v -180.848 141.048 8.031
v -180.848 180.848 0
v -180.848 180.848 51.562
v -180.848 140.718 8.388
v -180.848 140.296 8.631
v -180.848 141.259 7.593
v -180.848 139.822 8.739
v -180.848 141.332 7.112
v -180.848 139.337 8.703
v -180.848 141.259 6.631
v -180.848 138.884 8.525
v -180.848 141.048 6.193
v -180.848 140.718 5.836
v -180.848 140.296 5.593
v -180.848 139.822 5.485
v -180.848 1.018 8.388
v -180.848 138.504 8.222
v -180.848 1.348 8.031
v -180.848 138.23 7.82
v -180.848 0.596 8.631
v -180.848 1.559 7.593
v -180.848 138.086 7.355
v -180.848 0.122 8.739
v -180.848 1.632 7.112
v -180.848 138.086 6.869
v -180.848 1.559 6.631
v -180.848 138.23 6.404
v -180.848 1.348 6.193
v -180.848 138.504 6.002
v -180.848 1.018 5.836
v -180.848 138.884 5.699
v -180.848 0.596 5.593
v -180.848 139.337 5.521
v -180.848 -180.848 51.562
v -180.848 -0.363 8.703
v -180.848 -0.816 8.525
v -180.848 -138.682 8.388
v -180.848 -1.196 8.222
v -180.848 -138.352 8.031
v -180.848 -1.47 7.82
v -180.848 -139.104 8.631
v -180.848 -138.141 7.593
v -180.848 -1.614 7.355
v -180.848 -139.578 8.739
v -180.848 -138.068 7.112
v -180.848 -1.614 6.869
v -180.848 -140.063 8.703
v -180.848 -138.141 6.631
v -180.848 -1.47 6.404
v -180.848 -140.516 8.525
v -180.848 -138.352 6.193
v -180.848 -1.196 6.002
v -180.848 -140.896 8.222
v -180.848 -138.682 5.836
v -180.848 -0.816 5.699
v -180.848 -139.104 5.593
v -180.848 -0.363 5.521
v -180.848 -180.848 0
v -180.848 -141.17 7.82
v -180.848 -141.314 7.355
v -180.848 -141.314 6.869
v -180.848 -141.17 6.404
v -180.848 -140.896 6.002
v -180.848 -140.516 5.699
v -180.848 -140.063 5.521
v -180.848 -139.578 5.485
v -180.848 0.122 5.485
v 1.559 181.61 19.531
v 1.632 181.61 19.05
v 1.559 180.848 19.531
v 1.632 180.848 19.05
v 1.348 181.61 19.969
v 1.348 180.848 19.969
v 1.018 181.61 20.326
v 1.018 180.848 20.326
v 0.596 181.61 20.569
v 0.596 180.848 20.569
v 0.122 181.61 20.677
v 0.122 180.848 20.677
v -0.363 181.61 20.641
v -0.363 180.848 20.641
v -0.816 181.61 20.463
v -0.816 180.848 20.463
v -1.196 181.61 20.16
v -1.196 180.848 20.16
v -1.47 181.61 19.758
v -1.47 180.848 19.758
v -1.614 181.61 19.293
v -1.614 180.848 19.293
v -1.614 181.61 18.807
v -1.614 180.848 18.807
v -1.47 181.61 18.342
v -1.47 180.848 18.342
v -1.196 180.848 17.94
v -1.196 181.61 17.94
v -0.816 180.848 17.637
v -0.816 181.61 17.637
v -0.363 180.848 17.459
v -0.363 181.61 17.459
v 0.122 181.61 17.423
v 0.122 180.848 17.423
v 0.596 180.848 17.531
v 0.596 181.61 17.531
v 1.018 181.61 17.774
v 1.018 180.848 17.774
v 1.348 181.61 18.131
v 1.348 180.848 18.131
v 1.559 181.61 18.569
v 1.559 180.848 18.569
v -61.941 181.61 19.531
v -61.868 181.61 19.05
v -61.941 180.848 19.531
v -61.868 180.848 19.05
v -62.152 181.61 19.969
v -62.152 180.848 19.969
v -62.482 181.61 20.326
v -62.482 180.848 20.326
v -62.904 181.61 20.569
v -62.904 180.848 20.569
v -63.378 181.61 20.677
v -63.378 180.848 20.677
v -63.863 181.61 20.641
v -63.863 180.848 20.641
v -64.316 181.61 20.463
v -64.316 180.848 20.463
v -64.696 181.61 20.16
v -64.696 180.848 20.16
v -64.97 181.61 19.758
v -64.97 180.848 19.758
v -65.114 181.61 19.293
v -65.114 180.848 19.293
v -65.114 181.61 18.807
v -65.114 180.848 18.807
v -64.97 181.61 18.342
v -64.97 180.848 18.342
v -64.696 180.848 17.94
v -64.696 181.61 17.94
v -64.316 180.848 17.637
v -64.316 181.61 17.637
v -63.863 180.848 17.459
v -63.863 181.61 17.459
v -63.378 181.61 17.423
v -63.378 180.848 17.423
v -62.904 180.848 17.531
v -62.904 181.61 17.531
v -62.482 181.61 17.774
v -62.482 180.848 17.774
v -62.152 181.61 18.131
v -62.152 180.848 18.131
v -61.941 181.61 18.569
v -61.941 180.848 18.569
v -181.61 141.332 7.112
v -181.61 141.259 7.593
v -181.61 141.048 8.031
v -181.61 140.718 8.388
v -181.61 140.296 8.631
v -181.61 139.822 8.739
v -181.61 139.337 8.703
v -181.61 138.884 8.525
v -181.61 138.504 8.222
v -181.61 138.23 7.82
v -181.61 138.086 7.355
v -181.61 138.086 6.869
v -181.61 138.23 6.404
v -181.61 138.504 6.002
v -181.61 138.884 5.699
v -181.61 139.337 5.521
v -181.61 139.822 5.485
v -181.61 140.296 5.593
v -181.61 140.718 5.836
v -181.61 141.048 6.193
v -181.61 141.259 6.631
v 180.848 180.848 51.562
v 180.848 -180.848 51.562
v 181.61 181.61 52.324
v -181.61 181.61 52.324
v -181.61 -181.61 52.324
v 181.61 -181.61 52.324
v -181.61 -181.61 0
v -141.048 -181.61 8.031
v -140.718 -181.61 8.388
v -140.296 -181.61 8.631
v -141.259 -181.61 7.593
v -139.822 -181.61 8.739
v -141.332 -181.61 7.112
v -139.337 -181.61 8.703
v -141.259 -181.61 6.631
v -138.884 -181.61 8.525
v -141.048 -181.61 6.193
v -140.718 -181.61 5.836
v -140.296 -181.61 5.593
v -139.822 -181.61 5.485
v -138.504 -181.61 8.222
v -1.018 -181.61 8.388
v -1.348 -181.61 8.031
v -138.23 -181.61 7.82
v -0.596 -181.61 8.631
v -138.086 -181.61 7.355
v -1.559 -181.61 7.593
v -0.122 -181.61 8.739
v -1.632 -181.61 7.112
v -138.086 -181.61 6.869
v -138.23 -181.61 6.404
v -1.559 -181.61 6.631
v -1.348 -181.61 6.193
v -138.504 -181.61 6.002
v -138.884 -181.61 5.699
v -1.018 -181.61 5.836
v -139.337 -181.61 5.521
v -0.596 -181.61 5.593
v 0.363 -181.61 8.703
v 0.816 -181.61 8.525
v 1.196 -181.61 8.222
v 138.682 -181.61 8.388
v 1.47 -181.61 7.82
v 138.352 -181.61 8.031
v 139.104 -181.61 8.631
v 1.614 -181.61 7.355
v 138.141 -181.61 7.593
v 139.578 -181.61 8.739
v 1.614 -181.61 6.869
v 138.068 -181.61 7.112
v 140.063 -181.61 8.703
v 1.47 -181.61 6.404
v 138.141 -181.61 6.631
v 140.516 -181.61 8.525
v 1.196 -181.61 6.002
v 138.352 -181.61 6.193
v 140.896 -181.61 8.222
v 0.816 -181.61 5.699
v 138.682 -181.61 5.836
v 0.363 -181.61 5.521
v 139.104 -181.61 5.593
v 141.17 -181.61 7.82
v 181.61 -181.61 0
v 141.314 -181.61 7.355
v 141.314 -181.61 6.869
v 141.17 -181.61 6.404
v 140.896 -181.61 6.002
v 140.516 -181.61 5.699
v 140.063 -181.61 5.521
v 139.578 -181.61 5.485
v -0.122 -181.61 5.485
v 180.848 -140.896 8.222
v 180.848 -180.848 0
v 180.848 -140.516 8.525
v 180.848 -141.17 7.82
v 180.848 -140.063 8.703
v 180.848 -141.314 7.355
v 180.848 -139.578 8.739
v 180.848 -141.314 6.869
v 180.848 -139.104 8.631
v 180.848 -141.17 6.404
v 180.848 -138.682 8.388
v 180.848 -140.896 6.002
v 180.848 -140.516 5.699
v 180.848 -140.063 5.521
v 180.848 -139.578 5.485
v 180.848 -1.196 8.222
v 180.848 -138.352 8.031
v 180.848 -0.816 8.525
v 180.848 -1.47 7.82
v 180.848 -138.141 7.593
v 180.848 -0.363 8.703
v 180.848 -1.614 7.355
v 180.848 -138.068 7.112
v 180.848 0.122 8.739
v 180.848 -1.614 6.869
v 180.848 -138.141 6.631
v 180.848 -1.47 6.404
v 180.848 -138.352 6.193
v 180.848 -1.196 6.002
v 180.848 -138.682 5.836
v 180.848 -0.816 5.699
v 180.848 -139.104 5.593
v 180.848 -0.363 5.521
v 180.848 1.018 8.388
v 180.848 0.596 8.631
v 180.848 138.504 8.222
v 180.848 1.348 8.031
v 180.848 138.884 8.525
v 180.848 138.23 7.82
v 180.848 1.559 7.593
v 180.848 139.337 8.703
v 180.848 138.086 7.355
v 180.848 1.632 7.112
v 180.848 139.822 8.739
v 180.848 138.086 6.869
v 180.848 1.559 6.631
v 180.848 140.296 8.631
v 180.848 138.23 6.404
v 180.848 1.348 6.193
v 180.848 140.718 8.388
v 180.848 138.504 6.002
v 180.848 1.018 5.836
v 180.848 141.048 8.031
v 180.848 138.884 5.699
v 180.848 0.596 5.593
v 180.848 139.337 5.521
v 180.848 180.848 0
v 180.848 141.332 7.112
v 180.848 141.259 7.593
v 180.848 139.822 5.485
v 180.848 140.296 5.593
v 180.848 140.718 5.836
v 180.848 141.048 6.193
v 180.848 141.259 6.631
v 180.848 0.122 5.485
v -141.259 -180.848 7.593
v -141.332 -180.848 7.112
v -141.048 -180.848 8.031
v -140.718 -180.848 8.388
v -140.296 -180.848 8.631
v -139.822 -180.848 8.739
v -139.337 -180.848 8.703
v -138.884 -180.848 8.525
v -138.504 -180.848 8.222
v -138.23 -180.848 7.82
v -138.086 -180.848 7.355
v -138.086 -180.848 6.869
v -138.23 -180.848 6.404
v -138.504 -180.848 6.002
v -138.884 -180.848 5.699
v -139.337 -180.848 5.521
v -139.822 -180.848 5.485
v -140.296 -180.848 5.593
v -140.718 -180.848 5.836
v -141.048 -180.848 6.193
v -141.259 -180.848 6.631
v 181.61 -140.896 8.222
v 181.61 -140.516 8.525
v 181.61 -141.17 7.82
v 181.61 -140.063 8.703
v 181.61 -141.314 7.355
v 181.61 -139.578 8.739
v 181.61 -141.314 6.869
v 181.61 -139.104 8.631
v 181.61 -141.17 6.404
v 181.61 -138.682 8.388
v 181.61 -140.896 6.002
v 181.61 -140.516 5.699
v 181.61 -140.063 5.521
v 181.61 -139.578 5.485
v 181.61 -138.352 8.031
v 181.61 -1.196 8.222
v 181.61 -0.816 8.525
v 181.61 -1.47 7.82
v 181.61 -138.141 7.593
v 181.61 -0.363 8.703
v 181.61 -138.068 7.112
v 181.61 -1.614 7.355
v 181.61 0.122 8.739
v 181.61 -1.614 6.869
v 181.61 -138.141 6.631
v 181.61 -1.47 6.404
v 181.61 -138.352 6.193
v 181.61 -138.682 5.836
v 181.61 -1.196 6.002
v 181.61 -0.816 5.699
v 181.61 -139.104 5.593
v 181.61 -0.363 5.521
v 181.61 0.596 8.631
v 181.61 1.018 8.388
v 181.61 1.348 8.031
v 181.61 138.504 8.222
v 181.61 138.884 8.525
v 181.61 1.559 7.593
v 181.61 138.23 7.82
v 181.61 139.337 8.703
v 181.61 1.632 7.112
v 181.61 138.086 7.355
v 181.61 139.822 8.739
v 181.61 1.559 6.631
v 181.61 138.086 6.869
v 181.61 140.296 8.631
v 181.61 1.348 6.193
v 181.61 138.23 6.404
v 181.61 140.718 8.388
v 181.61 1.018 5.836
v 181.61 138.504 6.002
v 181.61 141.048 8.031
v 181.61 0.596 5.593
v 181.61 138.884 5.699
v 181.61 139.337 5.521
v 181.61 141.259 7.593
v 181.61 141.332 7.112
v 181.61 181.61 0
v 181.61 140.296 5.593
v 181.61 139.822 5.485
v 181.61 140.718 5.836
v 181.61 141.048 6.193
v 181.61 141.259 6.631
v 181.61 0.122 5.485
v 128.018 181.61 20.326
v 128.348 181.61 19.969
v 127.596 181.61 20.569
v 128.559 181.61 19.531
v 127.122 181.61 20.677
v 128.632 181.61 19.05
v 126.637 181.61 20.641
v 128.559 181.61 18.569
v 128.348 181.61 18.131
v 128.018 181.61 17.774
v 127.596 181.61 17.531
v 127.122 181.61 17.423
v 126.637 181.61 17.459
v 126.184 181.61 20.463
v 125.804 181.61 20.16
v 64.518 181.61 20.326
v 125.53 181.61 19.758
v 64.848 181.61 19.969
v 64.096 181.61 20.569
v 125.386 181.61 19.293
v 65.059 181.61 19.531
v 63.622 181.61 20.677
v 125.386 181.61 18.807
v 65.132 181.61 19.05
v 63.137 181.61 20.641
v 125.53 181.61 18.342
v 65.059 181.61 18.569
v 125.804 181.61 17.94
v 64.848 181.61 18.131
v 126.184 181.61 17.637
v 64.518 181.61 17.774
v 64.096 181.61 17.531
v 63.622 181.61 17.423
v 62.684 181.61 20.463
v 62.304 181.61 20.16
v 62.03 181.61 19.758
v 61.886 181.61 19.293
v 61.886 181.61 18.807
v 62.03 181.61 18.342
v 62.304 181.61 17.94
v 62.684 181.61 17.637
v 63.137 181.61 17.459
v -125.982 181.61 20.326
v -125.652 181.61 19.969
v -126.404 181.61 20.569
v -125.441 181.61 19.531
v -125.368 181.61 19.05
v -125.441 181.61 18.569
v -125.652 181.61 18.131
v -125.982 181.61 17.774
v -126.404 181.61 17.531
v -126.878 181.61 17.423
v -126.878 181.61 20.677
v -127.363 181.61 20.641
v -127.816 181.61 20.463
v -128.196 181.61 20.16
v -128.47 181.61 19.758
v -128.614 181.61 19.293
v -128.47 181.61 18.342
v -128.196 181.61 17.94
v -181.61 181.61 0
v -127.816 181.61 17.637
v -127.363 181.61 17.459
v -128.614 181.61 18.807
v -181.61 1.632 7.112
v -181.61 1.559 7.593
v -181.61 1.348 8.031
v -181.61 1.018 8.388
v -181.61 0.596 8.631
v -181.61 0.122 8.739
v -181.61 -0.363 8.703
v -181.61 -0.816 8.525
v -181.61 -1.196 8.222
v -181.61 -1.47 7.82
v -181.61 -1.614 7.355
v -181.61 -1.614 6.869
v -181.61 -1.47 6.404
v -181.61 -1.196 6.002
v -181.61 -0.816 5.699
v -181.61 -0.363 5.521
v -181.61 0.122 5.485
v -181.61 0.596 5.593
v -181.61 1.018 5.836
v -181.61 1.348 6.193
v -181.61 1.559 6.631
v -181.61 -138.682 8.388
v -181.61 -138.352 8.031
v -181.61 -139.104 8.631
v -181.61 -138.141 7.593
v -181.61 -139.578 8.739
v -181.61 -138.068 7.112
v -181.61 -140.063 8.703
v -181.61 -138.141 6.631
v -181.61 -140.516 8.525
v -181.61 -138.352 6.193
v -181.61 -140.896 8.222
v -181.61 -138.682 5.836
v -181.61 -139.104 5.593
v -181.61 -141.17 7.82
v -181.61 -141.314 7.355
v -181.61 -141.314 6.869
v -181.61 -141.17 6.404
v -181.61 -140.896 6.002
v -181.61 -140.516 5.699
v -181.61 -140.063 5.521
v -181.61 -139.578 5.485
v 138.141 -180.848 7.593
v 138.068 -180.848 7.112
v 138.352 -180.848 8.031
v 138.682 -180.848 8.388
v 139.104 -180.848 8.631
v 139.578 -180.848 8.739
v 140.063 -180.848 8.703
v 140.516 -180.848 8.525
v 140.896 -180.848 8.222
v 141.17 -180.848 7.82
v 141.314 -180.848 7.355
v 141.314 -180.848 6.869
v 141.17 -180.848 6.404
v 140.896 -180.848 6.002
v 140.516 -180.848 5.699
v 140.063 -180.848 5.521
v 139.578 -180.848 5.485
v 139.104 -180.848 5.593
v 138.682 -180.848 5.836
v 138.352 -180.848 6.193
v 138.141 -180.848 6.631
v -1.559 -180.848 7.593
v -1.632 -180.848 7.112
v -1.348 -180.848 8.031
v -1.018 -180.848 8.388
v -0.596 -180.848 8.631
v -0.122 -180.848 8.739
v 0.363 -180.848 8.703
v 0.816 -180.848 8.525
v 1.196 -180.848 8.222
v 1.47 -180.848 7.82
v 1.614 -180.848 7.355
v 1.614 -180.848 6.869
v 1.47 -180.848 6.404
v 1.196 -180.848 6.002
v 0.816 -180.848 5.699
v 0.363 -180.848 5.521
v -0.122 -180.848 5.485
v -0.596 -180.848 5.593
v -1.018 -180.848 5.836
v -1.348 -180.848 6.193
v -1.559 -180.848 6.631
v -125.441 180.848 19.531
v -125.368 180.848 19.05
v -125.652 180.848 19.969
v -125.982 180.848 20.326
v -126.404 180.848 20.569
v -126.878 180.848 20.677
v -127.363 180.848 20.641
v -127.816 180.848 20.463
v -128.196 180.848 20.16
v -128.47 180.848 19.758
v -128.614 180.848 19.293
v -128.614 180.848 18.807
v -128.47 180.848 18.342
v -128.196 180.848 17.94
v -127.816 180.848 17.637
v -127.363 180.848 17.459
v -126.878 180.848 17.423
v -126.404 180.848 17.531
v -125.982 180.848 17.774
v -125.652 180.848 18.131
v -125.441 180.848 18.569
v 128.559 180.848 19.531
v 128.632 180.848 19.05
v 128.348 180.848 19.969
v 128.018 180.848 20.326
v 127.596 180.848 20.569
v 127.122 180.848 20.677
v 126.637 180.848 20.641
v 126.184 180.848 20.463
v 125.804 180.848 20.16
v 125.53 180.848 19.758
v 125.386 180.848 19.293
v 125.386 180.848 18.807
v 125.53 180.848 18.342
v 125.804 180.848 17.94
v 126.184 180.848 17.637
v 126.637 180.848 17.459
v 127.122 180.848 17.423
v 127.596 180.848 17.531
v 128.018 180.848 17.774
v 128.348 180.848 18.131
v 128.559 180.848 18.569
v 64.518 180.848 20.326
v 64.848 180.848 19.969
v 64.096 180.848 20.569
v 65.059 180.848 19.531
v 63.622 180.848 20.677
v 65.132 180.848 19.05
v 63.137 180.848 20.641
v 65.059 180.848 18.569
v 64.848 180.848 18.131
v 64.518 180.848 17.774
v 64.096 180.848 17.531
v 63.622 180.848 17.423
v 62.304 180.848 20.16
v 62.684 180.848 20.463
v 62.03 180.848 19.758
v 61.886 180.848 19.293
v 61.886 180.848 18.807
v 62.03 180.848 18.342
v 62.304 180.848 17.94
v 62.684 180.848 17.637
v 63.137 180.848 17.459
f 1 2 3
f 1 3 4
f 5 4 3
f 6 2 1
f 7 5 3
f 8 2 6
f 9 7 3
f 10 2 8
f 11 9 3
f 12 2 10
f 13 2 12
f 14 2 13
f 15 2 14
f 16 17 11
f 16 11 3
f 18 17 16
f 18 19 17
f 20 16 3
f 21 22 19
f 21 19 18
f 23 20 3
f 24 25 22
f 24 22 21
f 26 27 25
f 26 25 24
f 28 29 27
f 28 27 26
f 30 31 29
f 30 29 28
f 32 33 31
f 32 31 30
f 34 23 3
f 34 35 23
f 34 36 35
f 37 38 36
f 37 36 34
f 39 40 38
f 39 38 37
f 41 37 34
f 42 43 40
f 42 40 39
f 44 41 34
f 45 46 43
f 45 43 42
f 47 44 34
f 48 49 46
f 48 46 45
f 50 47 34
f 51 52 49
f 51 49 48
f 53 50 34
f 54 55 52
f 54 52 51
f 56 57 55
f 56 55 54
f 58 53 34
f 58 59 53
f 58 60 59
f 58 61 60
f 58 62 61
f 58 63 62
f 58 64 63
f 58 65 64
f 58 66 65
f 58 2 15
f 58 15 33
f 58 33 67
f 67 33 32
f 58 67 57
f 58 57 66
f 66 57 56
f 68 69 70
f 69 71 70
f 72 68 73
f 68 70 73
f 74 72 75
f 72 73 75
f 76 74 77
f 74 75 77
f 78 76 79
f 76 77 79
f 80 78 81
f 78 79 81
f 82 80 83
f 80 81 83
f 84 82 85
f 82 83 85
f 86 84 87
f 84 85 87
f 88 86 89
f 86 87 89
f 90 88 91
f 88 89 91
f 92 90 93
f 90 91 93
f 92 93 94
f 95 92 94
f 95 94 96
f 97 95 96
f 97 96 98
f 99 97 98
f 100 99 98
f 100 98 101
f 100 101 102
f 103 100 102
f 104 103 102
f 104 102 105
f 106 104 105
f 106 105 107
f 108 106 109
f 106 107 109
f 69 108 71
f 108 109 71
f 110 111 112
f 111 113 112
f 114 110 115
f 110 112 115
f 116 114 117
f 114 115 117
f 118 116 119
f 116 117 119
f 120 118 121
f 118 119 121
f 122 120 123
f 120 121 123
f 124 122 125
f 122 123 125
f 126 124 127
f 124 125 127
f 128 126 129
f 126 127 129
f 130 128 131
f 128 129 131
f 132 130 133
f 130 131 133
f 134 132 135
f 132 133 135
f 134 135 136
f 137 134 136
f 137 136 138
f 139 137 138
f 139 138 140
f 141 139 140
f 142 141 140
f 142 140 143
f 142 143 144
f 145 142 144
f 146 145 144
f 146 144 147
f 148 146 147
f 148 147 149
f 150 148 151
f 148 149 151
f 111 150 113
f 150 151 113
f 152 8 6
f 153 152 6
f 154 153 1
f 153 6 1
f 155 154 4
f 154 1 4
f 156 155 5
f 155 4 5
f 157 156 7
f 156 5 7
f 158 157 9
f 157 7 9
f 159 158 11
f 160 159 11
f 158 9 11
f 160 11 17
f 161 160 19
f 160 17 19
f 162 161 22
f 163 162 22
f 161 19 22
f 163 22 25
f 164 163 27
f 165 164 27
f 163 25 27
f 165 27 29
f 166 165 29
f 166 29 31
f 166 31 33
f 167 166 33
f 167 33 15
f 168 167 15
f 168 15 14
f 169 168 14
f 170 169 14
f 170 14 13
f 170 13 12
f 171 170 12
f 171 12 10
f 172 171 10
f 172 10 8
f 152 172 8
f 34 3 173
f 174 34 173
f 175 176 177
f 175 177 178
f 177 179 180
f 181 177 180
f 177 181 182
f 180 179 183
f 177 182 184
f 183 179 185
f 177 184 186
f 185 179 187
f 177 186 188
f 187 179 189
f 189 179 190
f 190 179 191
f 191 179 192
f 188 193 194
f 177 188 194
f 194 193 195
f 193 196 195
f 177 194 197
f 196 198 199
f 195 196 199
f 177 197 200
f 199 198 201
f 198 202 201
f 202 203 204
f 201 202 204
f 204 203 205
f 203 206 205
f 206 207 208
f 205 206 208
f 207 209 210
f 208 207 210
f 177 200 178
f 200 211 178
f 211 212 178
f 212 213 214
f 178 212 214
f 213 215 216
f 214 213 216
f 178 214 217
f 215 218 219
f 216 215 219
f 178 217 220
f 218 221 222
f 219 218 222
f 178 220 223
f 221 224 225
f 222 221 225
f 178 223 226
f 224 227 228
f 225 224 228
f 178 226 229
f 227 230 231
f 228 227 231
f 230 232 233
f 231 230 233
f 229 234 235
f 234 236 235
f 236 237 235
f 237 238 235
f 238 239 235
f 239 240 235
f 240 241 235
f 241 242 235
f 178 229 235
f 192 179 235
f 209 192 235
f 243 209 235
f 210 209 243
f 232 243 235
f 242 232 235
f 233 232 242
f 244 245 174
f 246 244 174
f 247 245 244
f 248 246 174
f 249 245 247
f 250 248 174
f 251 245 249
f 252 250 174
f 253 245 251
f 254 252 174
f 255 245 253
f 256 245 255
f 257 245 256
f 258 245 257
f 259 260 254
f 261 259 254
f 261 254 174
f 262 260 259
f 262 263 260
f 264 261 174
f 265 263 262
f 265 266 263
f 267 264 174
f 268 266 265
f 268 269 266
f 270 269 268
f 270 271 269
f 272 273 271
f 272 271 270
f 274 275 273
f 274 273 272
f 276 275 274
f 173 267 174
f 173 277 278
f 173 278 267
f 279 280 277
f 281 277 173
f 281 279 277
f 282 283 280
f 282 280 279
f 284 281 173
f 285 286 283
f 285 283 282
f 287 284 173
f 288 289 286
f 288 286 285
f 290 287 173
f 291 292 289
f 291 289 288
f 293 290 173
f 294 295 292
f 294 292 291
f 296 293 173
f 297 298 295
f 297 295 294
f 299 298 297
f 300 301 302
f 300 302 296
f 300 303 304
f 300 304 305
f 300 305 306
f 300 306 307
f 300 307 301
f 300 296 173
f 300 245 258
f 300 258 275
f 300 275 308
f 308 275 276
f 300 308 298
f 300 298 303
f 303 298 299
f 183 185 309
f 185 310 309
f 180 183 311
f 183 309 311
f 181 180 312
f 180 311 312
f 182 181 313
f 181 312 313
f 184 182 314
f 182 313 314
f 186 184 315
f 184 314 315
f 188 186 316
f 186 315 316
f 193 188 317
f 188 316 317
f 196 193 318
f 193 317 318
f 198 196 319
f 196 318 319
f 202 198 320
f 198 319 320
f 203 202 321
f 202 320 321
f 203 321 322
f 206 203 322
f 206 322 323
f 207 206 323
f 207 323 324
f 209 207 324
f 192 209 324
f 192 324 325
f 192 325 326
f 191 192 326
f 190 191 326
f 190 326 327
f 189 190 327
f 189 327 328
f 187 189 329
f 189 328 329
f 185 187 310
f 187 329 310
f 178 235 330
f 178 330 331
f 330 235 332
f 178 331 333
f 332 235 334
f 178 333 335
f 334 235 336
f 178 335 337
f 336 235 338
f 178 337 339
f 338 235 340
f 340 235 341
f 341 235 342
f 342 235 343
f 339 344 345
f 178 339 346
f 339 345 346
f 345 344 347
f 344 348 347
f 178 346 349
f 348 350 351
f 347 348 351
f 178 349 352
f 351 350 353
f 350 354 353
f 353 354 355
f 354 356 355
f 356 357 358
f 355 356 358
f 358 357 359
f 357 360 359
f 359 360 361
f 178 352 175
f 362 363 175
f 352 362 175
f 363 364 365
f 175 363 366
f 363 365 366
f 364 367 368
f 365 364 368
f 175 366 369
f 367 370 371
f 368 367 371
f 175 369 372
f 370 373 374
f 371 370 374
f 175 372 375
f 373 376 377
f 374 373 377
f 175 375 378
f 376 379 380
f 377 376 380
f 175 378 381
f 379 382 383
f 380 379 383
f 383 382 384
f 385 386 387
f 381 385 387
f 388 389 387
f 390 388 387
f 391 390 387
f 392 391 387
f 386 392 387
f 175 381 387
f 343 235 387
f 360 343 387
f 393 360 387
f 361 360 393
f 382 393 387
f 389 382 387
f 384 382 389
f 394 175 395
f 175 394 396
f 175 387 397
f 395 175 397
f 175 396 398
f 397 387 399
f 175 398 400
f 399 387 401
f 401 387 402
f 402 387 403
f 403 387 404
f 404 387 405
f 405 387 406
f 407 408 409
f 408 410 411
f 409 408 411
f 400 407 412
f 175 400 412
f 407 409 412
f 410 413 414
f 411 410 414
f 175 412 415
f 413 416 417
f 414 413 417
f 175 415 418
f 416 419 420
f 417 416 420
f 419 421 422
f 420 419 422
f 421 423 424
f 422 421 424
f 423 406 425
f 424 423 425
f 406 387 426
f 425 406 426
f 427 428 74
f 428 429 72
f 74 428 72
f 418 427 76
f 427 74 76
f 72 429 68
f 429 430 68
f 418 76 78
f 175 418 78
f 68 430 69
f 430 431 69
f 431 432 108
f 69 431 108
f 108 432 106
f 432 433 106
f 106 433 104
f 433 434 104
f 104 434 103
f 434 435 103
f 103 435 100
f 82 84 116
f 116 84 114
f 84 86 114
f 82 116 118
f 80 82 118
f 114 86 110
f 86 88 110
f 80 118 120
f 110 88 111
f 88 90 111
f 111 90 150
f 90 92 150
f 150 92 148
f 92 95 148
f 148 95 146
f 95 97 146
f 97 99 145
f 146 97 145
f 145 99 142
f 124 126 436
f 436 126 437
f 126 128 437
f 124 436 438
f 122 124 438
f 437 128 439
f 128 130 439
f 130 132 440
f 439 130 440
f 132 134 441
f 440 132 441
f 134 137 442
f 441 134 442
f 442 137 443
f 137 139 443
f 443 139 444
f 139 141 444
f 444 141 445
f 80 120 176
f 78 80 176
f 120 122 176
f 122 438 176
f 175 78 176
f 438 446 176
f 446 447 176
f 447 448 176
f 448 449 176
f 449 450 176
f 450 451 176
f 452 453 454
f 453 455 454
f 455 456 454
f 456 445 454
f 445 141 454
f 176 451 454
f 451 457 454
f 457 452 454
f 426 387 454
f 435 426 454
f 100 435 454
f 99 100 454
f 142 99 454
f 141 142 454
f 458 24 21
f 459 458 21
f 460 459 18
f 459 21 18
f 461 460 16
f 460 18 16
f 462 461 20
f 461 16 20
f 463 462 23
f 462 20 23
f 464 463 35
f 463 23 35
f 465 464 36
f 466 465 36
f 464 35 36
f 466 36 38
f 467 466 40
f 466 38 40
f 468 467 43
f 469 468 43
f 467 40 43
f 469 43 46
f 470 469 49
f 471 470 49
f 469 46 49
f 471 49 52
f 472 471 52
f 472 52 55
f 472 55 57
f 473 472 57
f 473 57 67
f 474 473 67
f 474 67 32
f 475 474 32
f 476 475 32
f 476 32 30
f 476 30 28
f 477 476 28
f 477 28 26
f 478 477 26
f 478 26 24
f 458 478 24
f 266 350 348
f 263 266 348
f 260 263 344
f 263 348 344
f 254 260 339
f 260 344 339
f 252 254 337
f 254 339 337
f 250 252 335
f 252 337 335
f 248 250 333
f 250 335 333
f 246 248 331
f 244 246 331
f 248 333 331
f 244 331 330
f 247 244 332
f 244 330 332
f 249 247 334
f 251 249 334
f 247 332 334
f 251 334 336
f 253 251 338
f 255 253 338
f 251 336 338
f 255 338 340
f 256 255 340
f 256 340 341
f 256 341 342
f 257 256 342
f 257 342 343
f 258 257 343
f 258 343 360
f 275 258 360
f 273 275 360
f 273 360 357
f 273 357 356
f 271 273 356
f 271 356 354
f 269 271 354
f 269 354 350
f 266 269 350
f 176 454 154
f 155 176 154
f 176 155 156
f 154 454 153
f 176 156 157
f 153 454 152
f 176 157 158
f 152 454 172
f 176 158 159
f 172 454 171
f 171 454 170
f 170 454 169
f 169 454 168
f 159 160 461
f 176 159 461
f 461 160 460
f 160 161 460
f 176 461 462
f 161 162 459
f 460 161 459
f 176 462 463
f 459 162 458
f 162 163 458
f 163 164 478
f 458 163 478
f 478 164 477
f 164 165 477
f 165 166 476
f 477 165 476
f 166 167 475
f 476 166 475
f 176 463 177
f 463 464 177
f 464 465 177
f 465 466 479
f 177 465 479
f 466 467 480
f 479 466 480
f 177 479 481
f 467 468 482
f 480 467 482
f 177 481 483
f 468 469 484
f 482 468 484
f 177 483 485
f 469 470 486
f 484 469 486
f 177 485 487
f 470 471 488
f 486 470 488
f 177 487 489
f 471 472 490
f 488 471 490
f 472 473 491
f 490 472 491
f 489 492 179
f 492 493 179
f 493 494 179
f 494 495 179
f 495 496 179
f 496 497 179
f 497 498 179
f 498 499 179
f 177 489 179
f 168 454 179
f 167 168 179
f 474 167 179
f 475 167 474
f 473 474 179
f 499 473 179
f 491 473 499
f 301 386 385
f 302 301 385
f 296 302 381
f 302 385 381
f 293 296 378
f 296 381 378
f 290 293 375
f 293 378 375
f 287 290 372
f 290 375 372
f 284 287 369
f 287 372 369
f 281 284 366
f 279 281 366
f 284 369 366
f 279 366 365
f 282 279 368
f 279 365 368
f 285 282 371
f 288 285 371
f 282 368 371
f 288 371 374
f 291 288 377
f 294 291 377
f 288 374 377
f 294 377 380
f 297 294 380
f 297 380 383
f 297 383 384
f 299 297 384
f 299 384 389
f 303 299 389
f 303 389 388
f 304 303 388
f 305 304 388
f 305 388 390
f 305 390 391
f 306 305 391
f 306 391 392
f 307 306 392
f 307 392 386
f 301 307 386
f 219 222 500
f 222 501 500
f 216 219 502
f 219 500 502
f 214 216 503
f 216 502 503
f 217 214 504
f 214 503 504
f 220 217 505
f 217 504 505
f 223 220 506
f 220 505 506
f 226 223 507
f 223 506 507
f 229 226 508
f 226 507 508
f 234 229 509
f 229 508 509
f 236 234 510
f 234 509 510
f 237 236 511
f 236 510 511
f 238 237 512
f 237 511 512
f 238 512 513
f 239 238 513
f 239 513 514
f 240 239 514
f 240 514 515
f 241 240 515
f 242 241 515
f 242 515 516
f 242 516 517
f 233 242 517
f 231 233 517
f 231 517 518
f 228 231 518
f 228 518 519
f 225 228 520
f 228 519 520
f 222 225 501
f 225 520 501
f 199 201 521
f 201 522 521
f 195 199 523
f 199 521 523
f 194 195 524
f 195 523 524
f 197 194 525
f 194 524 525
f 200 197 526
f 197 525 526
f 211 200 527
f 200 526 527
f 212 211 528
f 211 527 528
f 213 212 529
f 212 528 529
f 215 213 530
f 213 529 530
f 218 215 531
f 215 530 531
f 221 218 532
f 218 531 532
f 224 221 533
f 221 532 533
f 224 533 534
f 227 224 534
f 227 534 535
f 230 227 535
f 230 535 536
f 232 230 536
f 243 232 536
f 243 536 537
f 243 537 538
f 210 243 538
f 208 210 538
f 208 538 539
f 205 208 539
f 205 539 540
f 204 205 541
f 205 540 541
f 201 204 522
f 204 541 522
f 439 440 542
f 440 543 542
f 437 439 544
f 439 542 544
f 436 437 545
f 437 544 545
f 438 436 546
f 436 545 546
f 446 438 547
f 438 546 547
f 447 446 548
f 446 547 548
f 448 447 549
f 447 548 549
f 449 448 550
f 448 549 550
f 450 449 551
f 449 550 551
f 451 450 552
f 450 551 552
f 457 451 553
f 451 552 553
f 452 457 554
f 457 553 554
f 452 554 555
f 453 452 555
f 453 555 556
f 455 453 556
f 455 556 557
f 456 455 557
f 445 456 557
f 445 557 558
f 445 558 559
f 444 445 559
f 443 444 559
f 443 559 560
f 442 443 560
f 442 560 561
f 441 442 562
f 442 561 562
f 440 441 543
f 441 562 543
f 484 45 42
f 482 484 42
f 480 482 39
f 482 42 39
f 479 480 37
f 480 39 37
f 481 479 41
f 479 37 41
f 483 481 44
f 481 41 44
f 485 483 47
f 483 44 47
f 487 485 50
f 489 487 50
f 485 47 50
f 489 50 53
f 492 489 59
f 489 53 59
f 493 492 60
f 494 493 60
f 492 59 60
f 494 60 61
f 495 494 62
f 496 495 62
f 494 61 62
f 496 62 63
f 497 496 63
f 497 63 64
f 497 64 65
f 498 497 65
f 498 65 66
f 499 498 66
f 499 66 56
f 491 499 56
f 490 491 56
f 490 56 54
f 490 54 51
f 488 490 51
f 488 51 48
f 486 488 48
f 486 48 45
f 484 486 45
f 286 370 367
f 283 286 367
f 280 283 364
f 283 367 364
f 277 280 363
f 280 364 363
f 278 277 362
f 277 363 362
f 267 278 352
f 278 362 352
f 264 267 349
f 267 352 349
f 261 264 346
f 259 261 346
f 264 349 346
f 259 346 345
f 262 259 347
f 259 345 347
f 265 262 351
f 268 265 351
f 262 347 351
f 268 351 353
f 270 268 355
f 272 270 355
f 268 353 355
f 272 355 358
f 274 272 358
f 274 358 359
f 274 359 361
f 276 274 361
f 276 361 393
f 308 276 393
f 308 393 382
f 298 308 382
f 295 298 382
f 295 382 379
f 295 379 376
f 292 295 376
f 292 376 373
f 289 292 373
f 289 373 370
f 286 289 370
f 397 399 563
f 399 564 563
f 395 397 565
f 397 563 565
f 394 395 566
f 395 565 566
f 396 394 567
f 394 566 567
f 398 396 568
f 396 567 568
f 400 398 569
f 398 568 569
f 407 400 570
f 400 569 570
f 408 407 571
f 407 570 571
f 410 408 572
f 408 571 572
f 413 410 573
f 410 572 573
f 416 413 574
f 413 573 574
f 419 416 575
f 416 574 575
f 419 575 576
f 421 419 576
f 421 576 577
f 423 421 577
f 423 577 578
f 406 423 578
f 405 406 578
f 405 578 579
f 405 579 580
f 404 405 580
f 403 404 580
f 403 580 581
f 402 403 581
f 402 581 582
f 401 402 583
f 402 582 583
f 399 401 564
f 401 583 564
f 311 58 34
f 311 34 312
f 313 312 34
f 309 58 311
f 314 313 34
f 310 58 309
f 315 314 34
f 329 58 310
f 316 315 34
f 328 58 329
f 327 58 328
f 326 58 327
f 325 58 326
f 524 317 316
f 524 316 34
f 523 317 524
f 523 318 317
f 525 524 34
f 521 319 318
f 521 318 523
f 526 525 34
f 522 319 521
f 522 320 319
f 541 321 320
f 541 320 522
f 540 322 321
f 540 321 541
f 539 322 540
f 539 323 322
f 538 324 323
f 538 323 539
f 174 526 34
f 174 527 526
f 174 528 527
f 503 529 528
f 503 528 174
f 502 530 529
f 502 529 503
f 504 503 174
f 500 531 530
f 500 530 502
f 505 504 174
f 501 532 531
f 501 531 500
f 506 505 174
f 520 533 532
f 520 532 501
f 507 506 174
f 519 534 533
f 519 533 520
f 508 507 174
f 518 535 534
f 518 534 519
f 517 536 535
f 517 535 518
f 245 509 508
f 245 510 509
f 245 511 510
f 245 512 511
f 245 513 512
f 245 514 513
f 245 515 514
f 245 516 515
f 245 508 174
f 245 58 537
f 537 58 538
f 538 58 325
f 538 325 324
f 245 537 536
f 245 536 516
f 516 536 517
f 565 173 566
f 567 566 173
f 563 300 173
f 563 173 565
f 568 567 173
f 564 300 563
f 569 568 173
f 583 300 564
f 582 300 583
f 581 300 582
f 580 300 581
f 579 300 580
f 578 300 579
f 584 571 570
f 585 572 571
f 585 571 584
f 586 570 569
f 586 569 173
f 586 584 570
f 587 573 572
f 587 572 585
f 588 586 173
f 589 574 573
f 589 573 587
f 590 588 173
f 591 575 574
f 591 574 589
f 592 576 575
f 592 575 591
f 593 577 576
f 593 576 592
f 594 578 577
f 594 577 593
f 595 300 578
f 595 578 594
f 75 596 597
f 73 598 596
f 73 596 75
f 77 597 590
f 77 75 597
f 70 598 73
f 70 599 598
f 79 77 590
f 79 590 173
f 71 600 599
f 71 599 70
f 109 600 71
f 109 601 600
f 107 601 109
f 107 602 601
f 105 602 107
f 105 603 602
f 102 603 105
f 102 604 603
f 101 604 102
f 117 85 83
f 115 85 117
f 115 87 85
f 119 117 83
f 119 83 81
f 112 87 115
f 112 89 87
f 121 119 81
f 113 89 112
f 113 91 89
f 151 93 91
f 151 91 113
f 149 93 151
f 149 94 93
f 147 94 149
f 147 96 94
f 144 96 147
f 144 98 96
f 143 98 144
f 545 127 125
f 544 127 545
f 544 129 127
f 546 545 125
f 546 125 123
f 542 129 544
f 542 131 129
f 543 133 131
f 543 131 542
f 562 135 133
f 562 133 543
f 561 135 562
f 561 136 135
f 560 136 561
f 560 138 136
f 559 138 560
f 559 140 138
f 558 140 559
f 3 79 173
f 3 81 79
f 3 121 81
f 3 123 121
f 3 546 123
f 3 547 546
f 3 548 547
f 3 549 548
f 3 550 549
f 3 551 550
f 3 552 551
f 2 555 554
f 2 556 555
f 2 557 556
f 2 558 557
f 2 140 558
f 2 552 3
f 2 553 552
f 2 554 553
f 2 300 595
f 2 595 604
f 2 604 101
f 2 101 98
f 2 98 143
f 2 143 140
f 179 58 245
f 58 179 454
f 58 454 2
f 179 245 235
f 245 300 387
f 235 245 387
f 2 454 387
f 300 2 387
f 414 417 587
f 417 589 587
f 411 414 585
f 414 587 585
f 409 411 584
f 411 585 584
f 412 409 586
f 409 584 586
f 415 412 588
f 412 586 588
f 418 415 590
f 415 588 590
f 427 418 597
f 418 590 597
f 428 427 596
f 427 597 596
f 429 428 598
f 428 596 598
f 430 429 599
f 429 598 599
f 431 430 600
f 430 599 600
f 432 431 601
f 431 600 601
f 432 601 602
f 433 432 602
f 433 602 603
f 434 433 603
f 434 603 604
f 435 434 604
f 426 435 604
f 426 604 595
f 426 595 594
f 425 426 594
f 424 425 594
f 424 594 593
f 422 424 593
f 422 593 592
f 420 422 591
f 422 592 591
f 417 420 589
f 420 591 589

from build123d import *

# Parameters (mm, degrees)
F1_DEPTH = 52.324
F2_T     = -0.762
F4_D     = 3.2639
F4_DEPTH = 0.762
F4_TIP   = 0.9805744872
F6_D     = 3.2639
F8_D     = 3.2639
F8_DEPTH = 0.762
F8_TIP   = 0.9805744872


with BuildPart() as f1:
    # F0 (on Top) → F1 (new body)
    with BuildSketch(Plane.XY):
        Polygon((0, 181.61), (-181.61, 181.61), (-181.61, -181.61), (0, -181.61), (0, 0), align=None)
        Polygon((181.61, 181.61), (0, 181.61), (0, 0), (0, -181.61), (181.61, -181.61), align=None)
    extrude(amount=F1_DEPTH)

    # F2
    f2_openings = [f1.faces().sort_by_distance(p)[0] for p in [
        (0, 0, 0),
    ]]
    offset(amount=F2_T, openings=f2_openings)

    # F4
    with Locations(Plane.XZ.offset(181.61)):
        with Locations((-139.7, 7.112), (0, 7.112), (139.7, 7.112)):
            Hole(F4_D / 2, depth=F4_DEPTH)
            with Locations((0, 0, -(F4_DEPTH + F4_TIP / 2))):  # 118° drill point
                Cone(0, F4_D / 2, F4_TIP, mode=Mode.SUBTRACT)

    # F6 (through all)
    with Locations(Plane(origin=(-181.61, 0, 0), x_dir=(0, -1, 0), z_dir=(-1, 0, 0))):
        with Locations((-139.7, 7.112), (0, 7.112), (139.7, 7.112)):
            Hole(F6_D / 2)

    # F8
    with Locations(Plane(origin=(0, 181.61, 0), x_dir=(-1, 0, 0), z_dir=(0, 1, 0))):
        with Locations((-127, 19.05), (-63.5, 19.05), (0, 19.05), (63.5, 19.05), (127, 19.05)):
            Hole(F8_D / 2, depth=F8_DEPTH)
            with Locations((0, 0, -(F8_DEPTH + F8_TIP / 2))):  # 118° drill point
                Cone(0, F8_D / 2, F8_TIP, mode=Mode.SUBTRACT)


solid = f1.part
